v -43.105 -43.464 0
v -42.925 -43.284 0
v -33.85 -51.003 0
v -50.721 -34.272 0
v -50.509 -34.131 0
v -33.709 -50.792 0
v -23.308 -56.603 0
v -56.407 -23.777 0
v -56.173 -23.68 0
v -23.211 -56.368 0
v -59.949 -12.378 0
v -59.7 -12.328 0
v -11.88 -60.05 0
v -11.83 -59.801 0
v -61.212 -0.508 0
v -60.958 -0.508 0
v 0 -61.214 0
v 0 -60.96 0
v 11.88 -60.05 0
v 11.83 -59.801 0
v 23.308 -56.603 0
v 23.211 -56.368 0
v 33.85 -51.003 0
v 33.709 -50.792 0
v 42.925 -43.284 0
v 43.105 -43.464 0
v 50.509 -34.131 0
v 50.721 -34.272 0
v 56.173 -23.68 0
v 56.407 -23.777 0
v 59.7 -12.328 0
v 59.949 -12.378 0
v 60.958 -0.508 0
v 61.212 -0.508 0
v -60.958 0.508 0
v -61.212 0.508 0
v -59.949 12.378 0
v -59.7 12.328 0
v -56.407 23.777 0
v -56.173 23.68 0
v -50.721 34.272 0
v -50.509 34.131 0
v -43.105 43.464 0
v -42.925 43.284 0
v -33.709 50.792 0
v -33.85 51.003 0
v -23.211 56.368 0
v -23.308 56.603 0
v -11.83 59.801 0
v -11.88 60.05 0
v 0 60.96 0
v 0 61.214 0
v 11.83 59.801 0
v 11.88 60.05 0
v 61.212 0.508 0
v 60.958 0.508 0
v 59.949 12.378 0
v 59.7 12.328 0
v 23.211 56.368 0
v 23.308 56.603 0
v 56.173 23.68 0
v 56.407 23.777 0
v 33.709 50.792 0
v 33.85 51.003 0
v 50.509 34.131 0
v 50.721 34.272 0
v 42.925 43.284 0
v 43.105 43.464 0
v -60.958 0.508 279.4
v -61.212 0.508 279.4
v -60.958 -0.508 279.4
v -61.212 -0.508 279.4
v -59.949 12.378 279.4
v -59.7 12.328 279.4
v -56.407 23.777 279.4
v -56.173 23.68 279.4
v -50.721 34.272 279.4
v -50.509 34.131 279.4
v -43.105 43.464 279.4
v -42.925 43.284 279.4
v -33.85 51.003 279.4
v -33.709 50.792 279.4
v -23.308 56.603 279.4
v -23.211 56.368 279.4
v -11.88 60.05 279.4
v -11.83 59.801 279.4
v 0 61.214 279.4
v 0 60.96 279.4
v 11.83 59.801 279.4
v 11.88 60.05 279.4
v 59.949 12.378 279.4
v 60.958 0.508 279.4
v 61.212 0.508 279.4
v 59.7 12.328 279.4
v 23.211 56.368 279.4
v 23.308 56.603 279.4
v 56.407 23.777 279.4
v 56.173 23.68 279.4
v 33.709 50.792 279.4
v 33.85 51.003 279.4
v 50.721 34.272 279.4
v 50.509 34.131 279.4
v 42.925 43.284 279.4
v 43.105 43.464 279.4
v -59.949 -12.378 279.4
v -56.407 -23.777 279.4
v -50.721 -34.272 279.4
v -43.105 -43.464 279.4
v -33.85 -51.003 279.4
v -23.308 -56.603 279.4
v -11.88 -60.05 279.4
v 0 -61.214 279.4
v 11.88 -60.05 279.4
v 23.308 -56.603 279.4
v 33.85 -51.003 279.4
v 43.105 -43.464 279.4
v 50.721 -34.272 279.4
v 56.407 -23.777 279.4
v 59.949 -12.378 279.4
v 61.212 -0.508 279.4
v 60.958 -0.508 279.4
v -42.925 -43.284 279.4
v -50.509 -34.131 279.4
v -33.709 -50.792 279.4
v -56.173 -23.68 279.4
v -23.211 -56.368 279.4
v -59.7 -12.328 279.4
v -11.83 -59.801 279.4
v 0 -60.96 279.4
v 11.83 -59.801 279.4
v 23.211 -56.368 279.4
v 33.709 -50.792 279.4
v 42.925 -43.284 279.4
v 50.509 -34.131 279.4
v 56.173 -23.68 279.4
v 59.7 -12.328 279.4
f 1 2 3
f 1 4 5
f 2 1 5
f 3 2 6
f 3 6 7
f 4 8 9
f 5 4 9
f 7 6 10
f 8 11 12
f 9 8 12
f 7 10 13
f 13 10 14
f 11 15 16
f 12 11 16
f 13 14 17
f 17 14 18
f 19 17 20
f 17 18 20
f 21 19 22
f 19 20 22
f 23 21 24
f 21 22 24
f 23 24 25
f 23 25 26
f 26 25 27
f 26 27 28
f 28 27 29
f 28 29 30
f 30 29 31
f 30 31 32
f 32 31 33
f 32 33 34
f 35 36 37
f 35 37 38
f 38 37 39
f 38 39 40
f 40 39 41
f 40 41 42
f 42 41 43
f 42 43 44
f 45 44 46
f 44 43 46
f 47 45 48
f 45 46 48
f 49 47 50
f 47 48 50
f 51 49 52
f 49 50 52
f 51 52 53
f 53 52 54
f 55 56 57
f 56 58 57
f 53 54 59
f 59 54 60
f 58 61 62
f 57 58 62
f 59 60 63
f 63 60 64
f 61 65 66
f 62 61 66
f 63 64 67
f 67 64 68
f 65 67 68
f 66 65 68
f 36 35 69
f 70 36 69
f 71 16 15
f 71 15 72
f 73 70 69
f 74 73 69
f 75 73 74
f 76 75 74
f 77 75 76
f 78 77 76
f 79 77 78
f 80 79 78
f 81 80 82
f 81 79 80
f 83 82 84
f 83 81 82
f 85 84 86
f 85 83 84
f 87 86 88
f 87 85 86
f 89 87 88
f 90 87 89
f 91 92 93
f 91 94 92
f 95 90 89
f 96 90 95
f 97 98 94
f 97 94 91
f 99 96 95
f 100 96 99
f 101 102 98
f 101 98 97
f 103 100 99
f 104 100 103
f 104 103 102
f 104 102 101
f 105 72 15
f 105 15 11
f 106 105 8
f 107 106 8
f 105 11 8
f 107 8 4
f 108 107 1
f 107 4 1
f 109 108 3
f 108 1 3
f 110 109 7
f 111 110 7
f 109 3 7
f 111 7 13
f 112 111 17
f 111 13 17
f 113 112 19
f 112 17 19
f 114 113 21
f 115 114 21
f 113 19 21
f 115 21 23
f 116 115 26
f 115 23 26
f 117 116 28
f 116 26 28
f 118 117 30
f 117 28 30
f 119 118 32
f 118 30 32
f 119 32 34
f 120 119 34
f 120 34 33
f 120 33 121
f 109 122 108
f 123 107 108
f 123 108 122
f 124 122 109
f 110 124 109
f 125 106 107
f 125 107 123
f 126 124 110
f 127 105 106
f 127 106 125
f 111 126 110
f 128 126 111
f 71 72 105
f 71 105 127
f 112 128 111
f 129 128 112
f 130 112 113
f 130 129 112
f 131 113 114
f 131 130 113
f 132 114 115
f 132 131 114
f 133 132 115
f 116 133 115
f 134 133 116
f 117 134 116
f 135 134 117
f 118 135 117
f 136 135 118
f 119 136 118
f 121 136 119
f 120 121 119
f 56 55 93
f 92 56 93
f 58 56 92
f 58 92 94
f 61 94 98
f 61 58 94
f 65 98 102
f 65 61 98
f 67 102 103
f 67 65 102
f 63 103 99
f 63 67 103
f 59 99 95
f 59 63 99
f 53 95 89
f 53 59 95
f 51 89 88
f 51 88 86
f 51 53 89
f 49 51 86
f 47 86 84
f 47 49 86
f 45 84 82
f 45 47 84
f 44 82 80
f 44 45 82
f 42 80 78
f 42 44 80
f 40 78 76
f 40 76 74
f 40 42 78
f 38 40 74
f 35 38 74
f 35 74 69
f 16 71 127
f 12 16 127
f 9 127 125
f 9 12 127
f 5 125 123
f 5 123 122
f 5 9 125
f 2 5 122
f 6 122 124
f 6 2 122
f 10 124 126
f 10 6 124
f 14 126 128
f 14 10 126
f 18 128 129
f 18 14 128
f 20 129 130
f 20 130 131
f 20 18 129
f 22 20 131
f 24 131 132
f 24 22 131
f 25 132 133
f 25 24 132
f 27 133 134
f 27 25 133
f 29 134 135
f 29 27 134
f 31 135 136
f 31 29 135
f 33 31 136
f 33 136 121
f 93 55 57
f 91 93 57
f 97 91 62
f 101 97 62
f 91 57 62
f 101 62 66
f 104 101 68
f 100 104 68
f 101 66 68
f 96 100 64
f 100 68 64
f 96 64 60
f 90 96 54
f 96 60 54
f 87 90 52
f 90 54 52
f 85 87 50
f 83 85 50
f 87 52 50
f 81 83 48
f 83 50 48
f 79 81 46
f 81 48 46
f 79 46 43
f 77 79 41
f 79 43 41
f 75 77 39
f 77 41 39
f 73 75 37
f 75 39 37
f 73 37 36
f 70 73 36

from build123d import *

# Parameters (mm, degrees)
SKETCH2_R               = 61.214
SKETCH2_R_2             = 60.96
BOSS_EXTRUDE1_DEPTH     = 279.4
CUT_EXTRUDE1_DEPTH      = 312.127191001
CUT_EXTRUDE1_DEPTH_BACK = 312.127191001
SKETCH5_W               = 279.4
SKETCH5_H               = 1.016


with BuildPart() as part:
    # Sketch2 → Boss-Extrude1 (new body)
    with BuildSketch(Plane.XY):
        Circle(SKETCH2_R)
        Circle(SKETCH2_R_2, mode=Mode.SUBTRACT)
    extrude(amount=BOSS_EXTRUDE1_DEPTH)

    # Sketch5 → Cut-Extrude1 (cut, two sides: drawn at the far end of the back side and taken through both)
    with BuildSketch(Plane.ZY.offset(61.214).offset(-CUT_EXTRUDE1_DEPTH_BACK)):
        with Locations((139.7, 0)):
            Rectangle(SKETCH5_W, SKETCH5_H)
    extrude(amount=CUT_EXTRUDE1_DEPTH + CUT_EXTRUDE1_DEPTH_BACK, mode=Mode.SUBTRACT)


with BuildPart() as cut_extrude1_piece_1:
    # of the separate pieces the step leaves, piece 1, a body of its own (cut_extrude1_pieces)
    add(part.part.solids().sort_by_distance((61.21189208, 0.508, 0))[0])


with BuildPart() as cut_extrude1_piece_2:
    # of the separate pieces the step leaves, piece 2, a body of its own (cut_extrude1_pieces)
    add(part.part.solids().sort_by_distance((-61.21189208, -0.508, 0))[0])


solid = Compound([cut_extrude1_piece_1.part, cut_extrude1_piece_2.part])
